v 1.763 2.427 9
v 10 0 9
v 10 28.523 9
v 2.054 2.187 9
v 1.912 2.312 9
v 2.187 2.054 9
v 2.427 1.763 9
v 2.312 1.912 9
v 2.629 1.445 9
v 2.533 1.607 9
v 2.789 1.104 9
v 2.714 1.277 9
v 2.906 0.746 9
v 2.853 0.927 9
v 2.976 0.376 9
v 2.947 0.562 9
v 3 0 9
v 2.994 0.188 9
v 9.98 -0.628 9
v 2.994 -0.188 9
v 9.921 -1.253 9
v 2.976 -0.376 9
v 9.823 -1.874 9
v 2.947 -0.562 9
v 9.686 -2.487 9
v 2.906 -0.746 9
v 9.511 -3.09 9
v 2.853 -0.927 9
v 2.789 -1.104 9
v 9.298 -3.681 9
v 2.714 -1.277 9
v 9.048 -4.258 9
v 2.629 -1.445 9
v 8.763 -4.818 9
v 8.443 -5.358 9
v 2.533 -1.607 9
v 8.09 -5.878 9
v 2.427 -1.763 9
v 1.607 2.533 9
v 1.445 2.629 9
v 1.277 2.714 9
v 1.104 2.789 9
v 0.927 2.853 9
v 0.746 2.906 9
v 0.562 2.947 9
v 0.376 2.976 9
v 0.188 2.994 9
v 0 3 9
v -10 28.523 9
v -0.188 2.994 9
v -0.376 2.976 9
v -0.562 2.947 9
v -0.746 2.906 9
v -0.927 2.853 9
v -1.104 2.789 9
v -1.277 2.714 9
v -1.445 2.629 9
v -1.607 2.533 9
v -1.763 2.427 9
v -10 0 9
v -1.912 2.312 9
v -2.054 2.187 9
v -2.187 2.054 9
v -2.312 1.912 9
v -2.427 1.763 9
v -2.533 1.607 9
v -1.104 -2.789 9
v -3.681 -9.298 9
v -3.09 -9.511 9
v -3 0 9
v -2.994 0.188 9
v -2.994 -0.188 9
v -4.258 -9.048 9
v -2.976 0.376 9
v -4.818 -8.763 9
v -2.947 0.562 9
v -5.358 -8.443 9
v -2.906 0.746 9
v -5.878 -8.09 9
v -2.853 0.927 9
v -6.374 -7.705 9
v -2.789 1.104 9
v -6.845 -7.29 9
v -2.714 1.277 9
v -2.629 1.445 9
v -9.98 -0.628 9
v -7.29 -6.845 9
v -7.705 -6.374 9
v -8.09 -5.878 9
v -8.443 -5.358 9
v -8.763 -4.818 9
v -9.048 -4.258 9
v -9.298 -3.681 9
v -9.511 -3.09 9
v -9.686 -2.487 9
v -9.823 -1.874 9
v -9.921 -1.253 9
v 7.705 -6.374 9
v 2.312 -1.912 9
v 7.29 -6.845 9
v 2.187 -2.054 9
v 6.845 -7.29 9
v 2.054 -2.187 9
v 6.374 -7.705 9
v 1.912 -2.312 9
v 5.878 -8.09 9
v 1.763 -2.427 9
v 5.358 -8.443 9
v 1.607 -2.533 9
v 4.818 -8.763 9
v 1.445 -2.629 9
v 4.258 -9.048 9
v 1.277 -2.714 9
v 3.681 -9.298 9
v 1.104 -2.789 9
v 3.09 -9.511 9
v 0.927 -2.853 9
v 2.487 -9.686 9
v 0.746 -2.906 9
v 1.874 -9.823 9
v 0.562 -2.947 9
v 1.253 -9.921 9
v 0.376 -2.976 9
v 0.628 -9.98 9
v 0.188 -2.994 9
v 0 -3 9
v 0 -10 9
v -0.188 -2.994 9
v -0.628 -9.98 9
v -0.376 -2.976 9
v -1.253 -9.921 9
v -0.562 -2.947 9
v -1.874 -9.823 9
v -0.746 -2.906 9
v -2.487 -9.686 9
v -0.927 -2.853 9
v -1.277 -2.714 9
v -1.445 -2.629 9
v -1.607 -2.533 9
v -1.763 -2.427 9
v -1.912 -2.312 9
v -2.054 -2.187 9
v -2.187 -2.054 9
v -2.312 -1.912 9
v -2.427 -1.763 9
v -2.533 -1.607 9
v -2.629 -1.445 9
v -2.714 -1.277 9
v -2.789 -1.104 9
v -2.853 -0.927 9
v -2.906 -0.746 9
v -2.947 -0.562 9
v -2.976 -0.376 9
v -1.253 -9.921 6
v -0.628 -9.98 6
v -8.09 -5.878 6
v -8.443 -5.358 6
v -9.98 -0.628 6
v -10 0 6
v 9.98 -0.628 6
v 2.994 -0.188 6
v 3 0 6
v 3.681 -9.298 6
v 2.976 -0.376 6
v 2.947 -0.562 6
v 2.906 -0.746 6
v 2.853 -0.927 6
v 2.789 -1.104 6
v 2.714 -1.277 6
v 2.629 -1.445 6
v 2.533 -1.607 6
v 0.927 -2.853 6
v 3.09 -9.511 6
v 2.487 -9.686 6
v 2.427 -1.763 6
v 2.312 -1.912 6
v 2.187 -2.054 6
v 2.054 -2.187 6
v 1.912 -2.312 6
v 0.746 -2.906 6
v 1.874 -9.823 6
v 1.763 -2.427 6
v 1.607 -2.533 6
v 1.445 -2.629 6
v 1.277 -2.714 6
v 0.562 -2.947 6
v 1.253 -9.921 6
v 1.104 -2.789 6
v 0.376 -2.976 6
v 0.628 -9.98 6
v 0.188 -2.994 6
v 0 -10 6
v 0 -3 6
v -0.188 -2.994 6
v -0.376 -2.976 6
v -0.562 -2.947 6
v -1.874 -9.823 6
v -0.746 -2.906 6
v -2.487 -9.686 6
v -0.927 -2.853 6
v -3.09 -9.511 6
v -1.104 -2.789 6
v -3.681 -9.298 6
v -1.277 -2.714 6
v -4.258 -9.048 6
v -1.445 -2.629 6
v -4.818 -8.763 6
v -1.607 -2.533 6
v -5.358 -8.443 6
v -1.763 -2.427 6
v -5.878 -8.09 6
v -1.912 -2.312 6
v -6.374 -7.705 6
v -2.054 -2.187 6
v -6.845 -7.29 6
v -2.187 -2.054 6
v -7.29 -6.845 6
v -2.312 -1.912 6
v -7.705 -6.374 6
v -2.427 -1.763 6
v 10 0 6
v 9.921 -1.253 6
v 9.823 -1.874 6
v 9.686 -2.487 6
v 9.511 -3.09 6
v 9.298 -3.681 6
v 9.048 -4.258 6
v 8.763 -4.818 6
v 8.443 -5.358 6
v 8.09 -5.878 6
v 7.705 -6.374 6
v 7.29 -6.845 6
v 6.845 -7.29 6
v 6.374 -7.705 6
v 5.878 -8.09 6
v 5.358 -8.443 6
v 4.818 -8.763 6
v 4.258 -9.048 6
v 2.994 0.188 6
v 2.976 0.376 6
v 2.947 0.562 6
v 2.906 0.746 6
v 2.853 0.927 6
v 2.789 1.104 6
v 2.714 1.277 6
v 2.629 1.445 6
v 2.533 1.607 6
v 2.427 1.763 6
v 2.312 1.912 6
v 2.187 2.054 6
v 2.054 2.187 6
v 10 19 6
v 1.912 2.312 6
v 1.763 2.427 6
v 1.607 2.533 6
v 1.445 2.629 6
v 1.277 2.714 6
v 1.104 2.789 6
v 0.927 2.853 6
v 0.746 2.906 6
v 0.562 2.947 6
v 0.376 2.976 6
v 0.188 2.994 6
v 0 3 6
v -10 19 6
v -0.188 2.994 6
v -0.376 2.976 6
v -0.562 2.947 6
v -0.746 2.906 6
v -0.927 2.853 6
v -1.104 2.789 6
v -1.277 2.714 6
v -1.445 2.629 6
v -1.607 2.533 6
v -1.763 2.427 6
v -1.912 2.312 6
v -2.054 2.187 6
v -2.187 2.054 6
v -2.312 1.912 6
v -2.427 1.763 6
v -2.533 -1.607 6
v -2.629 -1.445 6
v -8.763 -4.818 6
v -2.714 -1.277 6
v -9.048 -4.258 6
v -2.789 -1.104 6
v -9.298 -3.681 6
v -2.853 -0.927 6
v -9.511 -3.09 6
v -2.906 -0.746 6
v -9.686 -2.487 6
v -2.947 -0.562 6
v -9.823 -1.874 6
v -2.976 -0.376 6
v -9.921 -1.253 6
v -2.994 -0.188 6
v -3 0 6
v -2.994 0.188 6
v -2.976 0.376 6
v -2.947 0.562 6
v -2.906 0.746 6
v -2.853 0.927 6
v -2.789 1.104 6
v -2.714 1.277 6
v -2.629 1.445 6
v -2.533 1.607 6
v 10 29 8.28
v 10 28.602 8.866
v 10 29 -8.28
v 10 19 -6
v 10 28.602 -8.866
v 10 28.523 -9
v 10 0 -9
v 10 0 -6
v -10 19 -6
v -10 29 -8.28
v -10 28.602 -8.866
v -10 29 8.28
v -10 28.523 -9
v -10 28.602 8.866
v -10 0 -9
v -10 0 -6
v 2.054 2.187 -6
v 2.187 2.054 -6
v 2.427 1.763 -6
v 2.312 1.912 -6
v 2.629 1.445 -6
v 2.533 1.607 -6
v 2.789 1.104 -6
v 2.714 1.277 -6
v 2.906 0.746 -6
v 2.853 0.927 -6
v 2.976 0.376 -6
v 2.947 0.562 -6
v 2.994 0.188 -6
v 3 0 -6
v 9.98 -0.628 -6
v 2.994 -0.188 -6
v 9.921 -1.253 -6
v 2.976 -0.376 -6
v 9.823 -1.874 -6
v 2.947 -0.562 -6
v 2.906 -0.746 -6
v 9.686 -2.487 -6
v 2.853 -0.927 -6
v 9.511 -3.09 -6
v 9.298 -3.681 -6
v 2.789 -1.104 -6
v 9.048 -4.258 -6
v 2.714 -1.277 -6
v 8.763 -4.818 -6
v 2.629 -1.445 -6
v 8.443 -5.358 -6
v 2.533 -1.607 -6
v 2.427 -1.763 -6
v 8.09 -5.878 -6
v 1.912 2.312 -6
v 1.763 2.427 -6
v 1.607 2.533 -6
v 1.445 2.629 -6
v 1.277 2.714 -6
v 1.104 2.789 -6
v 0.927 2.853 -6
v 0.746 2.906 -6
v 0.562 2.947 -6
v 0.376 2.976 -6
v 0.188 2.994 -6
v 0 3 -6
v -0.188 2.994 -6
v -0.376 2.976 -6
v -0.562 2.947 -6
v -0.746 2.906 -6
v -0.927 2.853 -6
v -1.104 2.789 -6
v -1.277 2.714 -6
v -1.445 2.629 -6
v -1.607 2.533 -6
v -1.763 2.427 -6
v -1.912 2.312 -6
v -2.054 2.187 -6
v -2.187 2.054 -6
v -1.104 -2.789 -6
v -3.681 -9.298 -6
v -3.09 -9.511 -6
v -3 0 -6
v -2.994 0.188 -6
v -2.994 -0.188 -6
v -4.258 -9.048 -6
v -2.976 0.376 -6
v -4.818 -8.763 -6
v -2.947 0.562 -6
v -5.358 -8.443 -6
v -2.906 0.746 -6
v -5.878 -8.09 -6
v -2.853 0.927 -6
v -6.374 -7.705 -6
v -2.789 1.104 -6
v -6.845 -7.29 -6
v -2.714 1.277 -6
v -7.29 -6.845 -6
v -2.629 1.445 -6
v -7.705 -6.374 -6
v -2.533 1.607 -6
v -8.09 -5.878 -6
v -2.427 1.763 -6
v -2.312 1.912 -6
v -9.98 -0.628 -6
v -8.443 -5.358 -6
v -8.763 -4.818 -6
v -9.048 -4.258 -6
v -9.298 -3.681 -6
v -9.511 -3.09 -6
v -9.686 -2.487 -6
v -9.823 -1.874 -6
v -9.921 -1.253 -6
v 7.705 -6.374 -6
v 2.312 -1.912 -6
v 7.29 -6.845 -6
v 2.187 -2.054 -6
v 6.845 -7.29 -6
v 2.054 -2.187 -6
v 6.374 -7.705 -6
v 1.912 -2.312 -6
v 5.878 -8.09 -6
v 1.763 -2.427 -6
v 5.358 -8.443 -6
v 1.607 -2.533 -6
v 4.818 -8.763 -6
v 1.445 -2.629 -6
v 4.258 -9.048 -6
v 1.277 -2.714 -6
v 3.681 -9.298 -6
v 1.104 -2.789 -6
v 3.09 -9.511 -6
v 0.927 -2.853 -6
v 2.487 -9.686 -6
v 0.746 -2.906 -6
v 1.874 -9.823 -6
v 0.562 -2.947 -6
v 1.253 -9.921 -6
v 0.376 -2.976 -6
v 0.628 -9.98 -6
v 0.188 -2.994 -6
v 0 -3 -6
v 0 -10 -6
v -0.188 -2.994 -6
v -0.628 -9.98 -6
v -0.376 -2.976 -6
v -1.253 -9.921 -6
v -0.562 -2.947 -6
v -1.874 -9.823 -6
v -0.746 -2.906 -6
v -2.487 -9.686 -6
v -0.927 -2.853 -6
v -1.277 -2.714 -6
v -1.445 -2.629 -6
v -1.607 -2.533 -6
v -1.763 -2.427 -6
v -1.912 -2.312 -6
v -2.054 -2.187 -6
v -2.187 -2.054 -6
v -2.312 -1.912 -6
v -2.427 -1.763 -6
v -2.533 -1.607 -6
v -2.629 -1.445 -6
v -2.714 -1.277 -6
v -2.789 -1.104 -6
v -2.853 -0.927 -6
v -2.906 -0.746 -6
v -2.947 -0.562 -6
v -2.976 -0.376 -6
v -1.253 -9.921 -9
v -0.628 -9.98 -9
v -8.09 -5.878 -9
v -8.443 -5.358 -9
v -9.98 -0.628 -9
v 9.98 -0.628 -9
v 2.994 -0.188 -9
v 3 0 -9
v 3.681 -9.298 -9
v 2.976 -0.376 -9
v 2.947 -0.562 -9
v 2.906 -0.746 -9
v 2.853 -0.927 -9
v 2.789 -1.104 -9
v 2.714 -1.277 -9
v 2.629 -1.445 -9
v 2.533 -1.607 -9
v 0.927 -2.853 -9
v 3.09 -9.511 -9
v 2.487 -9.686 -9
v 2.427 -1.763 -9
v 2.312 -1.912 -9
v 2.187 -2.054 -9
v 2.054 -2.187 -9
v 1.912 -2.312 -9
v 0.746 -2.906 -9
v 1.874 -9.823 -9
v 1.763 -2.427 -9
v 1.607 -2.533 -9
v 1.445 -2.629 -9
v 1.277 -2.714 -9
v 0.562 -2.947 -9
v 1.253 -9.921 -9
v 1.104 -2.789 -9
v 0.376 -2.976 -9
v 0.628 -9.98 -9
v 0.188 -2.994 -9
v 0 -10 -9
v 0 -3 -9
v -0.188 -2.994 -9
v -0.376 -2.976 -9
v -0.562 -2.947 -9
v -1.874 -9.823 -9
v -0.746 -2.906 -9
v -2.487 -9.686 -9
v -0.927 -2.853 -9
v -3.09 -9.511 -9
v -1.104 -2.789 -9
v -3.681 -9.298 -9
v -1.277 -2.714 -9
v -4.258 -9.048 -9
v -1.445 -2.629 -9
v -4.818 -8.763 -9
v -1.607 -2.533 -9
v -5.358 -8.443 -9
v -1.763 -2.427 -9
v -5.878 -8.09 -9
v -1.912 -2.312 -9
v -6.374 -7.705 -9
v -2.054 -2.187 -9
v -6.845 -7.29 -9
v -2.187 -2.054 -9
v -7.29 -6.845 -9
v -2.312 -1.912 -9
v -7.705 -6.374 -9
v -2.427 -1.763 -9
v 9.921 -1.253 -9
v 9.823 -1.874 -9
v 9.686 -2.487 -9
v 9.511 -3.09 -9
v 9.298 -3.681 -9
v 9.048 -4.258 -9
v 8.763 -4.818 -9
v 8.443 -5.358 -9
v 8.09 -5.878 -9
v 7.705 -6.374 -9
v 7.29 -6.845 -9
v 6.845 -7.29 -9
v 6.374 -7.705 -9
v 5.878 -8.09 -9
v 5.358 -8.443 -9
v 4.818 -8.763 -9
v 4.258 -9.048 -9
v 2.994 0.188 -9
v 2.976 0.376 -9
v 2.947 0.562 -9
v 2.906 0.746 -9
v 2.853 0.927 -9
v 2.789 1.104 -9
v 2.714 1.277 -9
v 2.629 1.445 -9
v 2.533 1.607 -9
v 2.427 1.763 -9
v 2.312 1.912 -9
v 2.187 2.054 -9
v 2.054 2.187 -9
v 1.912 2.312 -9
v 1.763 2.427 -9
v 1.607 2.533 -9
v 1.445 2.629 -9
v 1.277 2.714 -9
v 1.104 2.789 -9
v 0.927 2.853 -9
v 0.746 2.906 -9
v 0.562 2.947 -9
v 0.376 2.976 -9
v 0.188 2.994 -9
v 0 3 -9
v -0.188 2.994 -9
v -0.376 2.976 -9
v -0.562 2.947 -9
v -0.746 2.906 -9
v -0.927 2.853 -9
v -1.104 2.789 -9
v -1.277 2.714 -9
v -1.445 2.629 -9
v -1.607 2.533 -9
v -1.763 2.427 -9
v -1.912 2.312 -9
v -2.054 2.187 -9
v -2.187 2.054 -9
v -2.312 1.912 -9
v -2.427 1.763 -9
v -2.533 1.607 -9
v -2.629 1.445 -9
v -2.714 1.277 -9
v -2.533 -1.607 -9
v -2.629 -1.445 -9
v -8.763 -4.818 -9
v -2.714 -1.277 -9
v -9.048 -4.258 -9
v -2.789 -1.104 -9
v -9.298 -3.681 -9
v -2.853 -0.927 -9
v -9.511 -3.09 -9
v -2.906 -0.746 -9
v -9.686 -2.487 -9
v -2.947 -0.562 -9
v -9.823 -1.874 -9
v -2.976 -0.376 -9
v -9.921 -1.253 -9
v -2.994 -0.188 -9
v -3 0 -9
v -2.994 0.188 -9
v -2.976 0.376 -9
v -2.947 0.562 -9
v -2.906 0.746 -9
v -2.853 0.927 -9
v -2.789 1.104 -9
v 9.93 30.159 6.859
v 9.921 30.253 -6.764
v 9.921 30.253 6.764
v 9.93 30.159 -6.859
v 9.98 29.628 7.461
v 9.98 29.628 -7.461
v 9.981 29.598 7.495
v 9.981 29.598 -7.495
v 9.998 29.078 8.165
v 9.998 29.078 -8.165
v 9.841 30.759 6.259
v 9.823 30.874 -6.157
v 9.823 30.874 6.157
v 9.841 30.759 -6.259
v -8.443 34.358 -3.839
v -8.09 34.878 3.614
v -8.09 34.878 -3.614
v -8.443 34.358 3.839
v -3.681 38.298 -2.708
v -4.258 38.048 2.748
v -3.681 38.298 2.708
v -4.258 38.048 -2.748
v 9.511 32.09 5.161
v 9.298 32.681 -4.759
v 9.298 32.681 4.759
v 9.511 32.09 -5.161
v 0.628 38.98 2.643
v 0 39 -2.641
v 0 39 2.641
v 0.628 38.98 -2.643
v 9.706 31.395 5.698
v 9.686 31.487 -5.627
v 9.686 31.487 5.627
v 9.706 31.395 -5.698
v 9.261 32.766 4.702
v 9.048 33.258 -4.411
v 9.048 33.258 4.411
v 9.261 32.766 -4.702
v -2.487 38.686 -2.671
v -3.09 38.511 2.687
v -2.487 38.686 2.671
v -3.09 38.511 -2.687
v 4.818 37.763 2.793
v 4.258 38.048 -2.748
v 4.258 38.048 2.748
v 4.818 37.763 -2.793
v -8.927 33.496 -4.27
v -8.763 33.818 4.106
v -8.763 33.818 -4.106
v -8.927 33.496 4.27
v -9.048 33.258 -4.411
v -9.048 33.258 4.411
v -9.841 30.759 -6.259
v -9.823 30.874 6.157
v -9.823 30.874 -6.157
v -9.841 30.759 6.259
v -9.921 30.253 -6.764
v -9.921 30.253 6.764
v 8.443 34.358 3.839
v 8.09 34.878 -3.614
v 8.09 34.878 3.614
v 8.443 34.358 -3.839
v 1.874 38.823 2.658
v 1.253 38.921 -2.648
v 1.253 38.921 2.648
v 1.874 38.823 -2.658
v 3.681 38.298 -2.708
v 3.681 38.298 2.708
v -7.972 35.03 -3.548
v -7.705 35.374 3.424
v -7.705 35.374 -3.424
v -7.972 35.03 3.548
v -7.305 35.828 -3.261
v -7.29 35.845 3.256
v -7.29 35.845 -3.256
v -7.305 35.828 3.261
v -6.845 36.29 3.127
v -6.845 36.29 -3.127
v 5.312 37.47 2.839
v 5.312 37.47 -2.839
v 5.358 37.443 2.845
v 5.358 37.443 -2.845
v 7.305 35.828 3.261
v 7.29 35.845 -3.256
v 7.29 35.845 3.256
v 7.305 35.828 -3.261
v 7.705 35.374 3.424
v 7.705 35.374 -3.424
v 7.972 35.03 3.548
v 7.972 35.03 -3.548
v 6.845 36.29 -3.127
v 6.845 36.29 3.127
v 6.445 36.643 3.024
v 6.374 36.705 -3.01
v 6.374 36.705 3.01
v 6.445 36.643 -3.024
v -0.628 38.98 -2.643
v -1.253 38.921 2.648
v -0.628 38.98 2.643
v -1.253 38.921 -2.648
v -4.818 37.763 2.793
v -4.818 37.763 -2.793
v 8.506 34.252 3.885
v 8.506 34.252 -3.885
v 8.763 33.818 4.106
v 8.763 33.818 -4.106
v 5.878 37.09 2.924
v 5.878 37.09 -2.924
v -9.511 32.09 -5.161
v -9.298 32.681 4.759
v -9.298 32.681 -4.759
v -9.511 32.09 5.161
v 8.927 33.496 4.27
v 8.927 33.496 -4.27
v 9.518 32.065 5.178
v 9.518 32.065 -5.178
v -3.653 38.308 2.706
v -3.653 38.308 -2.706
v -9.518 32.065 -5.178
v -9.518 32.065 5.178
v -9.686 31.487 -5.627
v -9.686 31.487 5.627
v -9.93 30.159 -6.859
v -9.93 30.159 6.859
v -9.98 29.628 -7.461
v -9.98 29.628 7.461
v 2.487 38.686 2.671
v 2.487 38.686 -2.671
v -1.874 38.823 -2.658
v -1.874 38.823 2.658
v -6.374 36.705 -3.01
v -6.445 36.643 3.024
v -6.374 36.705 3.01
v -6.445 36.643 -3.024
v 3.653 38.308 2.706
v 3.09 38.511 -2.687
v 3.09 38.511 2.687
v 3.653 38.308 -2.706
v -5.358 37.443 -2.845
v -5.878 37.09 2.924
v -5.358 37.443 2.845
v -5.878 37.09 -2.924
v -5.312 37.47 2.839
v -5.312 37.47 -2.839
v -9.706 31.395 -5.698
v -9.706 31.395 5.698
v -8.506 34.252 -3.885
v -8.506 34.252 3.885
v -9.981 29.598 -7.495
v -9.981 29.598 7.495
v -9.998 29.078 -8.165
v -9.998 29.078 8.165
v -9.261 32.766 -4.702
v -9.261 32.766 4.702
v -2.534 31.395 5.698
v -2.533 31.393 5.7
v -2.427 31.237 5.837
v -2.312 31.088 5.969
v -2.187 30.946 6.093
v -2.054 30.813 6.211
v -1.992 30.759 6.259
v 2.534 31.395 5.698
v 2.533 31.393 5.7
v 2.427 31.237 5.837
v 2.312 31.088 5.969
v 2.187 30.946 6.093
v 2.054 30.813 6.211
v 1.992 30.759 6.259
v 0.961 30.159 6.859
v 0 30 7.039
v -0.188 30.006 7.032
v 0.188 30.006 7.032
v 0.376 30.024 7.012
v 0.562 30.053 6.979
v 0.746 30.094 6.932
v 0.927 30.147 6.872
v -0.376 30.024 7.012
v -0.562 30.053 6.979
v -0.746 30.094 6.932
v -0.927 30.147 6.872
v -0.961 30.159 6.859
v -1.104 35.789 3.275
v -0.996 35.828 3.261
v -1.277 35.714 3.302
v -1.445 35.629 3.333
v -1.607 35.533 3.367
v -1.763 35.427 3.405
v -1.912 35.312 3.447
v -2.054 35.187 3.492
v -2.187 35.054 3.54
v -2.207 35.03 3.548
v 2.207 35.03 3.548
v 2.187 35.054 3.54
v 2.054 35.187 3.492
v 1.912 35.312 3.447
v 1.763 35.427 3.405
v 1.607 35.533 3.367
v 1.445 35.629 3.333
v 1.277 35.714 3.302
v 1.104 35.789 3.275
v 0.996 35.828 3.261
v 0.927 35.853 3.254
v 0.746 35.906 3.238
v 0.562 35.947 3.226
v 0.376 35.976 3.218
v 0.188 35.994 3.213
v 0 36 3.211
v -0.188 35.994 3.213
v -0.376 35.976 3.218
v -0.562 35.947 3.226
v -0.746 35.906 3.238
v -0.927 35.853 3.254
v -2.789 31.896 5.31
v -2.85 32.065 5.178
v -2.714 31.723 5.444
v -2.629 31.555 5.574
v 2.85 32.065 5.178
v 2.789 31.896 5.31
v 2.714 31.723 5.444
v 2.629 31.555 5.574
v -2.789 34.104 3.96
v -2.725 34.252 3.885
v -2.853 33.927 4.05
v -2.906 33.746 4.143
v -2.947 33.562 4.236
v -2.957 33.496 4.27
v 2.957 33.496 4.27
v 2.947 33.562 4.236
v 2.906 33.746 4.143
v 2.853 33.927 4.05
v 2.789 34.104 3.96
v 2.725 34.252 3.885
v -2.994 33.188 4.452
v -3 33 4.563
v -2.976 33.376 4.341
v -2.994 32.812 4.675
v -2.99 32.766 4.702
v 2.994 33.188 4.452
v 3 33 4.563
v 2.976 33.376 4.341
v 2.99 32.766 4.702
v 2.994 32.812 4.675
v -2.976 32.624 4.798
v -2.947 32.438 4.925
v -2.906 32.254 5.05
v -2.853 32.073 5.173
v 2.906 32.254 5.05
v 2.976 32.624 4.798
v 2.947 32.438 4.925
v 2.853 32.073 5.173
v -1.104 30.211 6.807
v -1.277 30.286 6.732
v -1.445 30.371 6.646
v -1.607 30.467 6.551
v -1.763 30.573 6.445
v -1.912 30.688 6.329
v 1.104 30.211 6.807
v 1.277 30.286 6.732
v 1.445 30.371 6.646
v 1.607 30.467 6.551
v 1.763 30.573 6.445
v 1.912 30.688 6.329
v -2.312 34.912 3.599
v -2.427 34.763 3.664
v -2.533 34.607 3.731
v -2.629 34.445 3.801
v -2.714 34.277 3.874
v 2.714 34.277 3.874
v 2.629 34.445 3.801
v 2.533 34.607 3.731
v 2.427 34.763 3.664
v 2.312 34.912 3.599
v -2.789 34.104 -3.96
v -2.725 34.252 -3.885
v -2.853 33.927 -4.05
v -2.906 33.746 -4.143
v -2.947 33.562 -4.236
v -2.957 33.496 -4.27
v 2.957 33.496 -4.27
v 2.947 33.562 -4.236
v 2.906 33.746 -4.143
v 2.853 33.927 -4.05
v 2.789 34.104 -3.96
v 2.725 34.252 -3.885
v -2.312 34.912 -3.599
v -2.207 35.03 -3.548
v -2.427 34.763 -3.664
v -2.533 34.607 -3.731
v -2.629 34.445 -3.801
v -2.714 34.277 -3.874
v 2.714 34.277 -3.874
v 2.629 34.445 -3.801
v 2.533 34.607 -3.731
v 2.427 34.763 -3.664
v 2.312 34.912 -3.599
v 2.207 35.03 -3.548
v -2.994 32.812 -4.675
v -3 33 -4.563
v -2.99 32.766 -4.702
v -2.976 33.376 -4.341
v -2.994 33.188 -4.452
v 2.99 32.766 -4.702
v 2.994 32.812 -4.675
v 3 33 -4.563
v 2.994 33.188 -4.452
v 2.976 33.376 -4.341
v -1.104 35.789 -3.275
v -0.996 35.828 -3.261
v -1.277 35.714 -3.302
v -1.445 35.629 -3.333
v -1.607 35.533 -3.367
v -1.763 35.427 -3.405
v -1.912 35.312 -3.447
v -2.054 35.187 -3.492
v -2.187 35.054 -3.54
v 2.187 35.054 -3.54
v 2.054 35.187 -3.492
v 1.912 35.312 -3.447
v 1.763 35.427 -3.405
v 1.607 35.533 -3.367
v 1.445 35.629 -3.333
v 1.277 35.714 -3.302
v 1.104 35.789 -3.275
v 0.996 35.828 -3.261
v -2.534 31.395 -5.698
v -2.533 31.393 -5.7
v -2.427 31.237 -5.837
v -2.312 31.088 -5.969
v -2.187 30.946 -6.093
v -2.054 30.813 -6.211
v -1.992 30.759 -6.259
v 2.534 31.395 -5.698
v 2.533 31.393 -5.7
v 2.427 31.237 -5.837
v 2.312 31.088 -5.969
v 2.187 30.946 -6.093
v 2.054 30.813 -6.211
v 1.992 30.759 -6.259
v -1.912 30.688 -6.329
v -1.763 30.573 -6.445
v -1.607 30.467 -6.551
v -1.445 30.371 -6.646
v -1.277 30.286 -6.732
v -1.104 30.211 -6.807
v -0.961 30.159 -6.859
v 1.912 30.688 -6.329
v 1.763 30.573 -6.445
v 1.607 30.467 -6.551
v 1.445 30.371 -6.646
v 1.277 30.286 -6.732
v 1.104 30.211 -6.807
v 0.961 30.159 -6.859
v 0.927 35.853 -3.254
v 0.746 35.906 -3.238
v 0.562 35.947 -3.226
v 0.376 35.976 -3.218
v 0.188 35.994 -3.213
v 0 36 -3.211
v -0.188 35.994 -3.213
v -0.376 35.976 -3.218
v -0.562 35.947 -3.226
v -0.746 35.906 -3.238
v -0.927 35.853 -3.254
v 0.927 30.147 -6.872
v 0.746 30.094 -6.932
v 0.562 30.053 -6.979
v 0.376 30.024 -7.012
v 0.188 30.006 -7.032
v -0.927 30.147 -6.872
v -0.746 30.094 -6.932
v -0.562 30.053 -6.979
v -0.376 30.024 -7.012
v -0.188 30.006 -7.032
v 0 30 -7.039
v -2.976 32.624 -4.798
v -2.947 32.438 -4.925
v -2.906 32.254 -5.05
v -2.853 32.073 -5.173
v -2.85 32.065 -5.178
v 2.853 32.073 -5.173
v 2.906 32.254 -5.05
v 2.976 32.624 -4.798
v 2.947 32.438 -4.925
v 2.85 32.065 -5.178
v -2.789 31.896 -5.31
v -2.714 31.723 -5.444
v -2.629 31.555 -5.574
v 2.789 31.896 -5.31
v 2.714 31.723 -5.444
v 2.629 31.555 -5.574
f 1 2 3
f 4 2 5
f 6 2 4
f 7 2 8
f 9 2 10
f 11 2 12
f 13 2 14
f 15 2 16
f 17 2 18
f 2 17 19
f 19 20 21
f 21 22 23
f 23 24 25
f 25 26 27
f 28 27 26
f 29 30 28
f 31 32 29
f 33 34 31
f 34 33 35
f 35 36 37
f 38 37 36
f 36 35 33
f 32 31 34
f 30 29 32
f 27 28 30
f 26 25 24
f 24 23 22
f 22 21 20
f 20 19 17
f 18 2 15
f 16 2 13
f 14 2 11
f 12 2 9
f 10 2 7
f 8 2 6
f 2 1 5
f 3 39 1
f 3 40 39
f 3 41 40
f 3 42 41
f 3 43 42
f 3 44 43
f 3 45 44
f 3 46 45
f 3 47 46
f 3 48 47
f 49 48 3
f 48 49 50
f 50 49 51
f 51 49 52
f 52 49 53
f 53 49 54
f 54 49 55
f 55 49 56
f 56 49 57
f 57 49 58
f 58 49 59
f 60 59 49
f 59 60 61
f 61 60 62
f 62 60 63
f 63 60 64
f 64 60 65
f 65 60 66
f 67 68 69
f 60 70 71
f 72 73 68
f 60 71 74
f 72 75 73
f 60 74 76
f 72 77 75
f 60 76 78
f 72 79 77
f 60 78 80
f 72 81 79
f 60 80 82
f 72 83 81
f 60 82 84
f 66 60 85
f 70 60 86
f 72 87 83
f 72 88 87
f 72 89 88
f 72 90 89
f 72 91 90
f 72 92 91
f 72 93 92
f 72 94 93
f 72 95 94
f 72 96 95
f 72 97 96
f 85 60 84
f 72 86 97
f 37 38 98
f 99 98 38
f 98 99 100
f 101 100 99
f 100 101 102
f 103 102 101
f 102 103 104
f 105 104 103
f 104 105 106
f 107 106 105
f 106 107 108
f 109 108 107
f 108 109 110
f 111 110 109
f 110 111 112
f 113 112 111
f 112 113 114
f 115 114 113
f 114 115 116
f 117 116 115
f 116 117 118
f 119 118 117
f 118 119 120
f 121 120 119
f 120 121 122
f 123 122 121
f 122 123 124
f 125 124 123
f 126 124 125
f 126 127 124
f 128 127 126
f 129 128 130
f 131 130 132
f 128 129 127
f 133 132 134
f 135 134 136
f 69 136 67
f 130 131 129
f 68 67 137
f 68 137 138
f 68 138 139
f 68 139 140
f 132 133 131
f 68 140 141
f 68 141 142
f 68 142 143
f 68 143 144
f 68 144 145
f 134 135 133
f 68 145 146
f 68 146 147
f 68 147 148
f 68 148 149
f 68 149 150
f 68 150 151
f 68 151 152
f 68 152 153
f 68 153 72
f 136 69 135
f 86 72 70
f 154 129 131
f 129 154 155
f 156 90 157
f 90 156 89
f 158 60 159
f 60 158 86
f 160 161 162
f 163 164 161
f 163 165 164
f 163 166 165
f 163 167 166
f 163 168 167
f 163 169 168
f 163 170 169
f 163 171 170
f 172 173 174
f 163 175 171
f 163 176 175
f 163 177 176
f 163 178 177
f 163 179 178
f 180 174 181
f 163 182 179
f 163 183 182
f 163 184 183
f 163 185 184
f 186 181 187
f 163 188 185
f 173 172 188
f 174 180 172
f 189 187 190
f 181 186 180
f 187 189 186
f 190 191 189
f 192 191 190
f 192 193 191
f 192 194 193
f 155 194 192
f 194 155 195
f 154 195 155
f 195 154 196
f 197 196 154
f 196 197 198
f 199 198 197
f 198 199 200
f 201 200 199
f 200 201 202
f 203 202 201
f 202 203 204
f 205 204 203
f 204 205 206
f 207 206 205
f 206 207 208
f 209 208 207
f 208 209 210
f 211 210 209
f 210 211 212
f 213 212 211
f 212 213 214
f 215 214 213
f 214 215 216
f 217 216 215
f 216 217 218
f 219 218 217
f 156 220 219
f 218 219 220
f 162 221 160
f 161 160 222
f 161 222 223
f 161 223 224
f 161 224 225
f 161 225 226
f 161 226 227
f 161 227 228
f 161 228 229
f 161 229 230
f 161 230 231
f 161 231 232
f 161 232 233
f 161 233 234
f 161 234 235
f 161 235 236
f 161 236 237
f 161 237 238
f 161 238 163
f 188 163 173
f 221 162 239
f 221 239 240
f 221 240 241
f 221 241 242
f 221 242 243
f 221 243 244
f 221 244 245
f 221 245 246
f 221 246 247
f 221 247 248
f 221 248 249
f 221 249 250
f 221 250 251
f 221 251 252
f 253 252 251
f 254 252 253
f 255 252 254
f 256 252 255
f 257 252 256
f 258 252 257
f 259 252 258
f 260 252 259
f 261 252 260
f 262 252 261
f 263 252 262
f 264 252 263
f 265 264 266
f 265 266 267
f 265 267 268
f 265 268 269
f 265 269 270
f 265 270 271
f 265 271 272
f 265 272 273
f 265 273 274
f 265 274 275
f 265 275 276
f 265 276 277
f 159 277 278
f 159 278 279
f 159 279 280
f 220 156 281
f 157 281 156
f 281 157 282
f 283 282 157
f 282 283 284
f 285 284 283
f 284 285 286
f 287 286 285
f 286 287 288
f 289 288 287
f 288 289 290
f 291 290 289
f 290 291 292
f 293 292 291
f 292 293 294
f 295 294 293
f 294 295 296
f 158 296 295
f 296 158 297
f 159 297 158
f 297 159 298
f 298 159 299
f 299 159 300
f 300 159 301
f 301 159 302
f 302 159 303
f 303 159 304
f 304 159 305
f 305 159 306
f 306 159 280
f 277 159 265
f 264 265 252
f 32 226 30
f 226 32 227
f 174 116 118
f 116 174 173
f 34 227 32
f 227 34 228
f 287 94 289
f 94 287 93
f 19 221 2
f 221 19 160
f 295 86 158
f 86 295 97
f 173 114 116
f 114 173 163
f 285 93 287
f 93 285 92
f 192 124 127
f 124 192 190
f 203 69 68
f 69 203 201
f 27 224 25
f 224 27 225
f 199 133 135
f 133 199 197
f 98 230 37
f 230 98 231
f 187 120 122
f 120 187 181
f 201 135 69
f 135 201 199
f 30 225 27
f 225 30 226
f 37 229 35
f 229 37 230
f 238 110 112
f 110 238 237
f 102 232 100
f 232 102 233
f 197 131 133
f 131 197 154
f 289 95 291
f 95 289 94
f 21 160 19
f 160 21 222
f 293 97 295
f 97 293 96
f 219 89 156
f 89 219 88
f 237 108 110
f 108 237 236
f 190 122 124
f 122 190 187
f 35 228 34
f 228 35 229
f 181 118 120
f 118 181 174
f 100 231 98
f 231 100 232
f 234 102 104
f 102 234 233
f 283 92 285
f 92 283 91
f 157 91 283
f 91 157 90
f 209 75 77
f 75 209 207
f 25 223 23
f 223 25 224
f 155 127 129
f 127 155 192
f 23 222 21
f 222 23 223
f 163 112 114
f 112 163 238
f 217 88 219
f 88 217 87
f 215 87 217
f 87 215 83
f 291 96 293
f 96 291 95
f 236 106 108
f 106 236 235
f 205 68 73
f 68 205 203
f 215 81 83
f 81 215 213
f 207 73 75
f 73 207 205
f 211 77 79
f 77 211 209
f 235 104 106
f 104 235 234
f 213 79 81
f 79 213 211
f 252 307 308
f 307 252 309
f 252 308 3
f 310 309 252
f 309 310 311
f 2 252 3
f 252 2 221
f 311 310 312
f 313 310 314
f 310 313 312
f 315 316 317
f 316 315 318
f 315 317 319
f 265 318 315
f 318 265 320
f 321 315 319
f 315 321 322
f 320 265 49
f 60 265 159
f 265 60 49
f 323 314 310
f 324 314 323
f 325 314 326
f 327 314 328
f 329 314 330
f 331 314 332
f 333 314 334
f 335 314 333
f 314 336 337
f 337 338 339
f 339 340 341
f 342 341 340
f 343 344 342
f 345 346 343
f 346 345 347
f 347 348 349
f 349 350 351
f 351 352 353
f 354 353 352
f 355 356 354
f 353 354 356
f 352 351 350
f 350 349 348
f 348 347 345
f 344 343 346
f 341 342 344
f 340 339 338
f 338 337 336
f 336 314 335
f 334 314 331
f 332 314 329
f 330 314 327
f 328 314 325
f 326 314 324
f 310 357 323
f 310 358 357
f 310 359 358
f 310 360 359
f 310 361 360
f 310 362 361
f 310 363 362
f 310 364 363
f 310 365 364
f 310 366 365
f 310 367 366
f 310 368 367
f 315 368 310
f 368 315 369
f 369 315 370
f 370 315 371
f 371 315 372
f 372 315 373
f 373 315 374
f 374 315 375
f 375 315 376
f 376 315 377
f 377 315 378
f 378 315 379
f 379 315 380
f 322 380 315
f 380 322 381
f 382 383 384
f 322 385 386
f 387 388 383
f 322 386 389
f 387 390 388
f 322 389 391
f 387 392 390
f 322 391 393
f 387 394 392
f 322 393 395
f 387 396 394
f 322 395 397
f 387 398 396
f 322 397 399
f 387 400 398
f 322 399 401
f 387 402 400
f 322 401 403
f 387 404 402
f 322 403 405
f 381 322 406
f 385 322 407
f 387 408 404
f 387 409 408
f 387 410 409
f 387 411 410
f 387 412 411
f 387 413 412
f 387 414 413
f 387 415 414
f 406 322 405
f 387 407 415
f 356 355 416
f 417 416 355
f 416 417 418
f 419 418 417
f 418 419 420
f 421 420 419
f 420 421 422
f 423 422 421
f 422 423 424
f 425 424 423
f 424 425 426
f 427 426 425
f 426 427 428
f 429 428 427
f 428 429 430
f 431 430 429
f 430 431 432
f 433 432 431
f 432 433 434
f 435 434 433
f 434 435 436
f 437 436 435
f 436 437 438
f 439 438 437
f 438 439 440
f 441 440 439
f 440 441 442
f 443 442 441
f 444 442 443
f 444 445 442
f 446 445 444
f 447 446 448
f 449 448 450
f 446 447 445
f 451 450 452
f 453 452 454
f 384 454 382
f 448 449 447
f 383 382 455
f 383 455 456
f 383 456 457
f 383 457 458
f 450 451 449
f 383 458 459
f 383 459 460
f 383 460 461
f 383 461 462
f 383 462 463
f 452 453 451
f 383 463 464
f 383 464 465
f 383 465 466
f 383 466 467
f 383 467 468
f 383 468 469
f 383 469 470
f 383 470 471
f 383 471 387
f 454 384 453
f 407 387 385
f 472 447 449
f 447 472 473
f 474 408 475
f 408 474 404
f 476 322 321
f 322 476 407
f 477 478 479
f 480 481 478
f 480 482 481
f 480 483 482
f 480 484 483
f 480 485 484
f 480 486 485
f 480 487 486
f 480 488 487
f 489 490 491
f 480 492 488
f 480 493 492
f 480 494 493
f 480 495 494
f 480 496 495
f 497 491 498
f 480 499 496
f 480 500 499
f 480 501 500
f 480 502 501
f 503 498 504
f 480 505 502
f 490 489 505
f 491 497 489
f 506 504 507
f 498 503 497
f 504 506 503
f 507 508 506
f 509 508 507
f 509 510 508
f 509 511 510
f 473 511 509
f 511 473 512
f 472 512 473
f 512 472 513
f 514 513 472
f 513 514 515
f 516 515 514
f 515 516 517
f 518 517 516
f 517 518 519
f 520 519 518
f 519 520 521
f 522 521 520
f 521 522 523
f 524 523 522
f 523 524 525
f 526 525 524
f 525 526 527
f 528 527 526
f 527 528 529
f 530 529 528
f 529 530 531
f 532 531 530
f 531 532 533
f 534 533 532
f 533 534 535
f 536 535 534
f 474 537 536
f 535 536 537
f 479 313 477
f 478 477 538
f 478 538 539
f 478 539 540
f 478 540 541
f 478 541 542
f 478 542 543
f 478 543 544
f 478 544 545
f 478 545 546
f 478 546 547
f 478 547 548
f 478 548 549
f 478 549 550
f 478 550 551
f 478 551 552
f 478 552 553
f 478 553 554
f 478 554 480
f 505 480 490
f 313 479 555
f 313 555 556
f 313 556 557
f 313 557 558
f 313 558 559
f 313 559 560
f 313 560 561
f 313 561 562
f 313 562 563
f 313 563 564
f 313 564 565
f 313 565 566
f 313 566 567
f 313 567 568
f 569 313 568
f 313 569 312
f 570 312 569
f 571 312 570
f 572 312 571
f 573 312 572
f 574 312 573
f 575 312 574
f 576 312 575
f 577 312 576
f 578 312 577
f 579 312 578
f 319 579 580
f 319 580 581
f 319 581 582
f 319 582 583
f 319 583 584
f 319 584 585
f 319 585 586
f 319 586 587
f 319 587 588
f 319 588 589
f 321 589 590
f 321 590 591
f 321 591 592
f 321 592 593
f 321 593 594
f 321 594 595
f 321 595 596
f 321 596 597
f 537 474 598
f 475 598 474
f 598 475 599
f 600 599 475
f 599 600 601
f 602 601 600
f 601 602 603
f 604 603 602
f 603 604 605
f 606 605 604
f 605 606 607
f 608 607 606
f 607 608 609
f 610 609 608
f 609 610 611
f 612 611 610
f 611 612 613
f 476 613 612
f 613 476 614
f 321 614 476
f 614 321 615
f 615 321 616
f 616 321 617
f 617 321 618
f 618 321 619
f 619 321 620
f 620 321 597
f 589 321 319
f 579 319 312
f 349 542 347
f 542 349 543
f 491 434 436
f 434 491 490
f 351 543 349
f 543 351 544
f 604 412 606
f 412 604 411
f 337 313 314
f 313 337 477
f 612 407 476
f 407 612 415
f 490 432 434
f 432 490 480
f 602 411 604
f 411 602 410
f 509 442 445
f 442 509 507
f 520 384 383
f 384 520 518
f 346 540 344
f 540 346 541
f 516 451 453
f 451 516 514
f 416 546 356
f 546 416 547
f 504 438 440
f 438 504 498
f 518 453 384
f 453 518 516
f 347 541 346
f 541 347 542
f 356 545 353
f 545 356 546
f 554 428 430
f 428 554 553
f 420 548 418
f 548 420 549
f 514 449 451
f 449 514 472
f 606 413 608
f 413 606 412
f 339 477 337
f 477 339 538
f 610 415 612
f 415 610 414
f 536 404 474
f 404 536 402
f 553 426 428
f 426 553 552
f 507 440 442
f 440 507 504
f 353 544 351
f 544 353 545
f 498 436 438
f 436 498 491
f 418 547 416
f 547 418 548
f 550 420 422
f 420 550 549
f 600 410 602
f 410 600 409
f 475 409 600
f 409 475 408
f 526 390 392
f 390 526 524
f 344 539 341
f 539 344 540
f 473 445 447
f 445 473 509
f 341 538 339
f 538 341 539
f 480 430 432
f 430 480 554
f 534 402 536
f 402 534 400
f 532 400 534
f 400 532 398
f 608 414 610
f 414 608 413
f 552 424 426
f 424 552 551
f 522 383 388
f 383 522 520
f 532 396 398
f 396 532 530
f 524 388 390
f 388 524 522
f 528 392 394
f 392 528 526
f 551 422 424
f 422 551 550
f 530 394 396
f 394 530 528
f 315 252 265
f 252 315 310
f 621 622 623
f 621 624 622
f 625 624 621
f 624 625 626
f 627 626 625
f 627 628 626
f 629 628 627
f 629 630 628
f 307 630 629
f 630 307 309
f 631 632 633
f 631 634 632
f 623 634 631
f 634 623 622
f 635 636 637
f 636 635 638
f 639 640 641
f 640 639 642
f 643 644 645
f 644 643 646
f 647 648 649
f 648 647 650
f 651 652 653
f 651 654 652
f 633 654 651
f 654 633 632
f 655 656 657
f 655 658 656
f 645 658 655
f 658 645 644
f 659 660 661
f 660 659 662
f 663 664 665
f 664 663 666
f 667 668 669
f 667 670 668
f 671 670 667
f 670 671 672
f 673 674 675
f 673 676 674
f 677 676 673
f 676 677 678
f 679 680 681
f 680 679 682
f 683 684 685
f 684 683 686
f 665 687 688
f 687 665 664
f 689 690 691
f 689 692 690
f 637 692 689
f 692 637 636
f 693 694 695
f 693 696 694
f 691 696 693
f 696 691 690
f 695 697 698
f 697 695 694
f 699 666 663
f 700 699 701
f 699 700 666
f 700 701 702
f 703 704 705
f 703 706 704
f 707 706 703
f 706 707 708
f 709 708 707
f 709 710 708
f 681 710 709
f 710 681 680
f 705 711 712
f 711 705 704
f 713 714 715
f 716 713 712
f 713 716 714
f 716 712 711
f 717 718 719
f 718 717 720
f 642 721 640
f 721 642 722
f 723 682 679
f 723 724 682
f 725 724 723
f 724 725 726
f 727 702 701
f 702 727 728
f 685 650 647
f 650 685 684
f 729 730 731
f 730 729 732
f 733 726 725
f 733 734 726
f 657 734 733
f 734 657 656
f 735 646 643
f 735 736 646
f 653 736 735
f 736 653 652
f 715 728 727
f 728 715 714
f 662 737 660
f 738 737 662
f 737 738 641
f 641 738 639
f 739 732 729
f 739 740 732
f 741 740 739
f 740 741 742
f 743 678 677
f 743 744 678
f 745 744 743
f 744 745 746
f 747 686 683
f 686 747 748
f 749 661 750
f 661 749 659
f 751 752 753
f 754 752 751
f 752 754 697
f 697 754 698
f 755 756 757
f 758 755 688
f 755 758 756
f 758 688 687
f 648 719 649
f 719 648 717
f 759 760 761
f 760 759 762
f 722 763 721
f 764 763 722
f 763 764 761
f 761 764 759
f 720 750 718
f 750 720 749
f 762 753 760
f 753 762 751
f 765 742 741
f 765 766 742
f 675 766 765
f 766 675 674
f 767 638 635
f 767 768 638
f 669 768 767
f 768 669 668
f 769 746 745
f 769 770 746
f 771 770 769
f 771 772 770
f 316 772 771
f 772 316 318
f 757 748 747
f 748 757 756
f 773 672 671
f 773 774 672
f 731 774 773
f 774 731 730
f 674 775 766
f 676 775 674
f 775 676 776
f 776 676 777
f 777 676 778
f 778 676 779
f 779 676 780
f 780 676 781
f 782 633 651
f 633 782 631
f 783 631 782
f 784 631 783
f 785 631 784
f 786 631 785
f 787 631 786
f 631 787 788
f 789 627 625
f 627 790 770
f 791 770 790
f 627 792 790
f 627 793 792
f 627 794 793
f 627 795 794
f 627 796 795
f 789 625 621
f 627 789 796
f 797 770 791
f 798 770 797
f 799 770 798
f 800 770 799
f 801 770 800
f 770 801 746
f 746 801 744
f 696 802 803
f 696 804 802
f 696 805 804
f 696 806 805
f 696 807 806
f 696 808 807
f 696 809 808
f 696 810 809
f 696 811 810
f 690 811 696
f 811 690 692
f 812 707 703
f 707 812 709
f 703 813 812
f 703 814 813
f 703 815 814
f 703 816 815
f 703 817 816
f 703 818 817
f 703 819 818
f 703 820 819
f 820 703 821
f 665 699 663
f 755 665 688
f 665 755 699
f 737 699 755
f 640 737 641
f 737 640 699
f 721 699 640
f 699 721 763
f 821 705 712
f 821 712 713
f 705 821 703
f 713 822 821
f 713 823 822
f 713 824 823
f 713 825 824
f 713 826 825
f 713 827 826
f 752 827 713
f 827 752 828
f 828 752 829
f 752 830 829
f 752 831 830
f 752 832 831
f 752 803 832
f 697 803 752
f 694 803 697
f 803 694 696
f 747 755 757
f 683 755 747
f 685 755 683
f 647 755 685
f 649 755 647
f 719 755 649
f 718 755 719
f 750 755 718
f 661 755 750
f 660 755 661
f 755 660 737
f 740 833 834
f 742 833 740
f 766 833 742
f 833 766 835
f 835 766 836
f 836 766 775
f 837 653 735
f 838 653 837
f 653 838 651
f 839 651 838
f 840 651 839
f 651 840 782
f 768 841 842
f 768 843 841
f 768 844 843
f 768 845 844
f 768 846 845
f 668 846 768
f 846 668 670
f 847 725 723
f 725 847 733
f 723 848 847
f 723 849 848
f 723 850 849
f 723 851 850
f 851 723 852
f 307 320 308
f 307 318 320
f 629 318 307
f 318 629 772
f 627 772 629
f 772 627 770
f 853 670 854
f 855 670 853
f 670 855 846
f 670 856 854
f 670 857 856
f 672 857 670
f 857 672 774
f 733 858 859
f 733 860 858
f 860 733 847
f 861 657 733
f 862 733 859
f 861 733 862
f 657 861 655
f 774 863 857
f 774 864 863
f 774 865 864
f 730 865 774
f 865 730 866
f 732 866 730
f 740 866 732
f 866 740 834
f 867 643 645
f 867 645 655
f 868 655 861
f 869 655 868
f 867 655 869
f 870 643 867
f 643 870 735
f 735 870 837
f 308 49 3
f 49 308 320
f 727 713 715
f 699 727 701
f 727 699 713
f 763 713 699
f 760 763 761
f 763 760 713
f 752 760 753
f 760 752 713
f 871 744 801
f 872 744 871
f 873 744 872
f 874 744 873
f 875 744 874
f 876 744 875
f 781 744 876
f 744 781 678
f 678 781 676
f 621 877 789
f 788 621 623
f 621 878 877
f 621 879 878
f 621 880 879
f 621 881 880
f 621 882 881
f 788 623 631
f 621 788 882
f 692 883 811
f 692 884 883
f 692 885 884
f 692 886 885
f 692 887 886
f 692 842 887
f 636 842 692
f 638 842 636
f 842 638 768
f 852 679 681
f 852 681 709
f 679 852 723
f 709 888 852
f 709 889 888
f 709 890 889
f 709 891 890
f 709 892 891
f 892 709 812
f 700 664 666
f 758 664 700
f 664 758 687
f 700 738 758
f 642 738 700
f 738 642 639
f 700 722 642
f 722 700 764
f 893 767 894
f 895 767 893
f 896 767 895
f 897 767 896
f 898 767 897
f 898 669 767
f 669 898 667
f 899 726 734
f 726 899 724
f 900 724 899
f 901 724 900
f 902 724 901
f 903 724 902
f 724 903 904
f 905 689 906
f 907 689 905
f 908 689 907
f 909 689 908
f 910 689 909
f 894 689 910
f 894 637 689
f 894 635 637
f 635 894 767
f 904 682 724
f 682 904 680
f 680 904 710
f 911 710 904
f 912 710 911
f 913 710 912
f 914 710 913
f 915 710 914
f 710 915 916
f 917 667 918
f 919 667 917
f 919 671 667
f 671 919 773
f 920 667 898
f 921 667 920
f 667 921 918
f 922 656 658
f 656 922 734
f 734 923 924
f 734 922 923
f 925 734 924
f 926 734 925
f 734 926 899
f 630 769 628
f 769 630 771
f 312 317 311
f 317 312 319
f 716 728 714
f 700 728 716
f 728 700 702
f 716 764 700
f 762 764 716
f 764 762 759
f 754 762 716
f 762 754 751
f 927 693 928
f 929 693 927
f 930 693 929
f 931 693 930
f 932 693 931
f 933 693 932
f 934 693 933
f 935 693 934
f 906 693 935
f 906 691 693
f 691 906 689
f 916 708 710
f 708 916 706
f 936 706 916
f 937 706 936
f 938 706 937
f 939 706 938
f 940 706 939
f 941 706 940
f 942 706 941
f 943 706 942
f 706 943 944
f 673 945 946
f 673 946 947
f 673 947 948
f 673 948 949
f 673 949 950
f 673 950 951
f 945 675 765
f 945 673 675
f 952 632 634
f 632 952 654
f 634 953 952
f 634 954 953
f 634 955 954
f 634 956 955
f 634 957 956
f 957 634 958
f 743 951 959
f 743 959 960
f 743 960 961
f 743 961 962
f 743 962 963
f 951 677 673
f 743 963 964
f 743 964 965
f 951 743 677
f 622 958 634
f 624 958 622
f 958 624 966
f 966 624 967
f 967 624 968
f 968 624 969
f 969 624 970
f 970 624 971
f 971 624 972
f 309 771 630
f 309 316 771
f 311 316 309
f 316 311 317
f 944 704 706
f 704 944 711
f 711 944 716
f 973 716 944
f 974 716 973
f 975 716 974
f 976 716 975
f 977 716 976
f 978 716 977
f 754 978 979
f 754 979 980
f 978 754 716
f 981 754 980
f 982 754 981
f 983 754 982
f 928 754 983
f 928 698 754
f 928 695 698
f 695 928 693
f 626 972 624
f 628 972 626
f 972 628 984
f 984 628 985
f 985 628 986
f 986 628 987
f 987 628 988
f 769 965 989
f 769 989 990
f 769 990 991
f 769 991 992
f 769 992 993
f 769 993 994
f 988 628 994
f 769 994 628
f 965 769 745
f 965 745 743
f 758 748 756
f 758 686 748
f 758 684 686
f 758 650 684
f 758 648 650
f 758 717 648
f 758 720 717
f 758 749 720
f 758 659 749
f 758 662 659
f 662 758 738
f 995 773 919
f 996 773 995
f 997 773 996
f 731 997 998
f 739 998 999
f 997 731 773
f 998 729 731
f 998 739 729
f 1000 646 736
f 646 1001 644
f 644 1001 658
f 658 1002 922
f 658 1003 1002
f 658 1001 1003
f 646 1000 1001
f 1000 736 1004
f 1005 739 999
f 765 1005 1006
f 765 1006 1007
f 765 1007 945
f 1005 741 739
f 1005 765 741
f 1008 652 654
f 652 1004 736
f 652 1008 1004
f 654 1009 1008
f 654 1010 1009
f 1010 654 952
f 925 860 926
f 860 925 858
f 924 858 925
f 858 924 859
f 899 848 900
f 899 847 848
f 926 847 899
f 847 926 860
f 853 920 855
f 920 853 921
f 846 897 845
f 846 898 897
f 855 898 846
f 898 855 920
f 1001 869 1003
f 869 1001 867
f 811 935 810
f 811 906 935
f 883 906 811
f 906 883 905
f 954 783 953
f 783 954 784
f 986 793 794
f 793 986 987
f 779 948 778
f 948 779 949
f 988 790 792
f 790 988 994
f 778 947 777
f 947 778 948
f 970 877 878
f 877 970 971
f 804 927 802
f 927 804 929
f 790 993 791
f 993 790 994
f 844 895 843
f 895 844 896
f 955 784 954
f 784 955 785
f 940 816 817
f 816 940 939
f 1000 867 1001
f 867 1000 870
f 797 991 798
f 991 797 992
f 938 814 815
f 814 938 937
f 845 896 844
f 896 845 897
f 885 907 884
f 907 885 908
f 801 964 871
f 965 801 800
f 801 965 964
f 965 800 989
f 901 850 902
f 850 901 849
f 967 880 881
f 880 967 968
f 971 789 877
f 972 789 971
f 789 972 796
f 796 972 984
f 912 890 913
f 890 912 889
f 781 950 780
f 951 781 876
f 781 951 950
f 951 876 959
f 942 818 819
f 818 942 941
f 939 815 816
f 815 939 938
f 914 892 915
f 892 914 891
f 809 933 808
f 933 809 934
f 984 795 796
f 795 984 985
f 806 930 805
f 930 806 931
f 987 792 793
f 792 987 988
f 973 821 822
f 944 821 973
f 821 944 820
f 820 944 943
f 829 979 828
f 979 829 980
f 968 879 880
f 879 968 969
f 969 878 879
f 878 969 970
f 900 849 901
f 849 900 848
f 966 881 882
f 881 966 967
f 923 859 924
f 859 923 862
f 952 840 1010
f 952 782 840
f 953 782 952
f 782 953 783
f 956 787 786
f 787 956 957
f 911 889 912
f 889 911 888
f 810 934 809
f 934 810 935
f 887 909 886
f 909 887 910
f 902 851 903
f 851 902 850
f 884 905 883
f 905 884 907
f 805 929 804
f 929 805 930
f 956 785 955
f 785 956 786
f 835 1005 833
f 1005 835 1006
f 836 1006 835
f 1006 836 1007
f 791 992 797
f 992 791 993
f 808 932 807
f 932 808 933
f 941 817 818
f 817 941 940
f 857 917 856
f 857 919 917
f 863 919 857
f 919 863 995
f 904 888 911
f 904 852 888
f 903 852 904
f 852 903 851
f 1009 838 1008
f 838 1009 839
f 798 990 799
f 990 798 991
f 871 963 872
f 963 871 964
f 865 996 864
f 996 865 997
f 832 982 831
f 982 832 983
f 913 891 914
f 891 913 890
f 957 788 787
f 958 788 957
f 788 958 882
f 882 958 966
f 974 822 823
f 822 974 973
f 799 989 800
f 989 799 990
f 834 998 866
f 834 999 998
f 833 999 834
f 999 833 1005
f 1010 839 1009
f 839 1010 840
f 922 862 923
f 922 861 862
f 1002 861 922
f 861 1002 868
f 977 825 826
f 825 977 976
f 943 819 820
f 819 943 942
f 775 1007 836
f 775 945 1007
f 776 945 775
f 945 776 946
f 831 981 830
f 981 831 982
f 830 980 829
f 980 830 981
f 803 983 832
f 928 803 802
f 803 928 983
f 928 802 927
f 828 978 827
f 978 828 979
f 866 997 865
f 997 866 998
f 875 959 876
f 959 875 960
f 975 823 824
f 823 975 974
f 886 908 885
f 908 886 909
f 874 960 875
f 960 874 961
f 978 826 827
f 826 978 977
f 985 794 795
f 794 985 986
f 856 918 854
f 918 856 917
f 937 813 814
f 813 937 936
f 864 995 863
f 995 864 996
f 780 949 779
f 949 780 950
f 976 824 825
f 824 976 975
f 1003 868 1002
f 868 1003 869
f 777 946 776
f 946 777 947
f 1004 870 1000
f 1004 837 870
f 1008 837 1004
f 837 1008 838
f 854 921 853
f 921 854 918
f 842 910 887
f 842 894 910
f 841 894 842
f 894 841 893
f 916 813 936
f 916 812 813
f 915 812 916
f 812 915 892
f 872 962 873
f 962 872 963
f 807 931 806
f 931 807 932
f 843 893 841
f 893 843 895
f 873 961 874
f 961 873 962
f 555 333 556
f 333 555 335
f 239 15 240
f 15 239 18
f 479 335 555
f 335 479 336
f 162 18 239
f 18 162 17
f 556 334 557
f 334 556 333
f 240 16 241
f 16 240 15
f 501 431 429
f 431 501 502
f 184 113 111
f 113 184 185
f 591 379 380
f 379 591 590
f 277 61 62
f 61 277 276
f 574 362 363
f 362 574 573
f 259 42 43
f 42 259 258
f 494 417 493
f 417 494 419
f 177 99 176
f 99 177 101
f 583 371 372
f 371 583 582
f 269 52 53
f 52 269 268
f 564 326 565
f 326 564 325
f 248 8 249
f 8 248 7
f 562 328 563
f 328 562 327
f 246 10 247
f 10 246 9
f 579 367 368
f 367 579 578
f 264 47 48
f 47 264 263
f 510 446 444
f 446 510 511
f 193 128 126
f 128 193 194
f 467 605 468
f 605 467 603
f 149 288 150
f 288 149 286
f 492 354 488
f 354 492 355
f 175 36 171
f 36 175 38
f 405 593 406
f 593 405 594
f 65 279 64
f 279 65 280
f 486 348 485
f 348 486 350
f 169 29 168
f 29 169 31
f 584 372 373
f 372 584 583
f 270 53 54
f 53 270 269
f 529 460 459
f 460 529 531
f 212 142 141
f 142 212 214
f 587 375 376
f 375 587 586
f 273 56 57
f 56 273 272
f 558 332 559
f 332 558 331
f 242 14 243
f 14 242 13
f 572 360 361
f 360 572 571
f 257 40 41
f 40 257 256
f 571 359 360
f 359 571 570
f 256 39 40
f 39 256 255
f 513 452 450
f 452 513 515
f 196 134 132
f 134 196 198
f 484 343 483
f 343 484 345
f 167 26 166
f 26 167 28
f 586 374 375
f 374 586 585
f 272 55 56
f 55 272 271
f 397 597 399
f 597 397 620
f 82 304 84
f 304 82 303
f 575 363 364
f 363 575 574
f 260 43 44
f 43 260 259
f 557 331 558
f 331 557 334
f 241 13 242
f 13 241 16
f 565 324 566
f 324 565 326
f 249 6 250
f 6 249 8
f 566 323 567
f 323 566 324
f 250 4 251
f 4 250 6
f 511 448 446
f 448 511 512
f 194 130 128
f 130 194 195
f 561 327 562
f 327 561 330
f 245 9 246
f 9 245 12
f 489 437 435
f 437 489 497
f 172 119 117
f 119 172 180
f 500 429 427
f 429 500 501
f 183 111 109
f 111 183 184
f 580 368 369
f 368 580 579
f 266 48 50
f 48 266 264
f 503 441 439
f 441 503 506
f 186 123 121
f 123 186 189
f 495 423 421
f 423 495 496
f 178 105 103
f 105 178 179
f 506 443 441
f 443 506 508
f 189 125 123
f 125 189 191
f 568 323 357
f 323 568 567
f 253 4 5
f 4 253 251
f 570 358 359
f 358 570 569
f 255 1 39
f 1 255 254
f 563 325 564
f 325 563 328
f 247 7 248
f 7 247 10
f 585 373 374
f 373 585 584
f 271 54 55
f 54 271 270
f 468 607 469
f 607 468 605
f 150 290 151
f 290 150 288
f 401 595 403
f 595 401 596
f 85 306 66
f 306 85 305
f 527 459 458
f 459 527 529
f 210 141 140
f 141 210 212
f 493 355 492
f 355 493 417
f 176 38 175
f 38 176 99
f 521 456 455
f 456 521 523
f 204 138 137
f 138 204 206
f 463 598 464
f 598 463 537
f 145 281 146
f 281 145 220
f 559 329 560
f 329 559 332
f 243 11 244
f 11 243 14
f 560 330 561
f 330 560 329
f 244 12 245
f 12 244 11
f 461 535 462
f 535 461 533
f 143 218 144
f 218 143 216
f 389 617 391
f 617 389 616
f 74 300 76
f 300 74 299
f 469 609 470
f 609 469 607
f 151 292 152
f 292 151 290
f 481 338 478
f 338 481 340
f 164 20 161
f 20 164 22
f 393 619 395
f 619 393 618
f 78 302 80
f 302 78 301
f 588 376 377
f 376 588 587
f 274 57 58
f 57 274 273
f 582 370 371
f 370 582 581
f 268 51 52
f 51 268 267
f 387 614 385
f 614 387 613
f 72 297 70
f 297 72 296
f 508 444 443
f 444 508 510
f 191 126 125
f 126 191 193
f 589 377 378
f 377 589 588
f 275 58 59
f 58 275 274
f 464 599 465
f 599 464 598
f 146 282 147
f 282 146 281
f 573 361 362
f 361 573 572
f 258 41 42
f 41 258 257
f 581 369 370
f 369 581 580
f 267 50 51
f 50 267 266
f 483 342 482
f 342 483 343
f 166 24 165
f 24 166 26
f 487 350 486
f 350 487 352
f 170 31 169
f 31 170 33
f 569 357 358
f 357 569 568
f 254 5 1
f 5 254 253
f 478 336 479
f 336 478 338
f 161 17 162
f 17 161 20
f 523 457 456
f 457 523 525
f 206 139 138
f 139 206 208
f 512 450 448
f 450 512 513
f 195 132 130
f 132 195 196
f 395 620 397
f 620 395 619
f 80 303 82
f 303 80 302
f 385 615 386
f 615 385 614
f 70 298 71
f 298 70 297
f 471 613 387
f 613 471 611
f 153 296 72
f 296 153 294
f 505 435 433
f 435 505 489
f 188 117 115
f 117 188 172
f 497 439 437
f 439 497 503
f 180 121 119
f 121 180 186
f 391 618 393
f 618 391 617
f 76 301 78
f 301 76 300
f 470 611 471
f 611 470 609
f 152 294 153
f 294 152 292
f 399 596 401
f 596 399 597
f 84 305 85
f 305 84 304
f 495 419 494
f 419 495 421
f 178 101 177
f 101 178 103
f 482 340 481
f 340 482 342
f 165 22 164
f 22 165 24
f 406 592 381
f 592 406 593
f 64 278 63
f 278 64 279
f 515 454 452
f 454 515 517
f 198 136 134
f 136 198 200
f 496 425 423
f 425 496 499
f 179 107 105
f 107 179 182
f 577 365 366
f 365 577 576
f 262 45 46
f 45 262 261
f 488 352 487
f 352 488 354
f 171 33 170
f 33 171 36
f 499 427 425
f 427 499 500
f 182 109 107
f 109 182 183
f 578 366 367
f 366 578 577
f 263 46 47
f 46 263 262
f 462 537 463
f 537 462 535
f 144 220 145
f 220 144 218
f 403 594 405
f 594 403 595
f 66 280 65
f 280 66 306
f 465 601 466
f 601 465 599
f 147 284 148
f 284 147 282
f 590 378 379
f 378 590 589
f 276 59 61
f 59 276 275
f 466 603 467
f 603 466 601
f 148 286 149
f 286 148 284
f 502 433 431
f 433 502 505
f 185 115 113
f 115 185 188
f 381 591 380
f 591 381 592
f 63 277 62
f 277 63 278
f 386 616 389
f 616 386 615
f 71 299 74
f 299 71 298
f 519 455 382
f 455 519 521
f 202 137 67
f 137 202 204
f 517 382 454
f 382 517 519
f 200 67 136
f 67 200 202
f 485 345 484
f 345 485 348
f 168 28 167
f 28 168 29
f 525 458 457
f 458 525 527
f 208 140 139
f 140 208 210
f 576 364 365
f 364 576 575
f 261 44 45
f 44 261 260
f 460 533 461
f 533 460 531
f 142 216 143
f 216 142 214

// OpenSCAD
//
// A test
// A Block with its wheel
//
// See drawing options at the bottom of the code.
//


module torus(ringDiam, torusDiam) { 
	rotate_extrude(convexity = ringDiam, $fn = 100) {
		translate([ringDiam / 2, 0, 0]) {
			circle(r = torusDiam / 2, $fn = 100);
		}
	}
} 

module wheel(ringDiam, torusDiam, axisDiam) {  
  difference() {
    cylinder(h=1.1 * torusDiam, r=(ringDiam / 2), center=true, $fn=100); // Thw wheel of the Pulley
    cylinder(h=12, r=(axisDiam / 2), center=true, $fn=100);  // Axis
    torus(ringDiam, torusDiam);                 // The groove
  }
}

module oneCheek(thickness, width, axisToBottomLen, axisDiam) {
  union() {
    translate([0, 0, 0]) {
      cylinder(h=thickness, r=(width / 2), center=true, $fn=100);
    }
    translate([0, axisToBottomLen / 2, 0]) {
      cube(size=[width, axisToBottomLen, thickness], center=true);
    }
  }
}

module block(sideThickness,       // Cheek's thickness
             sideWidth,           // Cheek's width
             internalThickness,   // Between the cheeks
             wheelPlusRopeDiam,   // Wheel + rope
             axisDiam) {          // axis diam
  totalThickness = internalThickness + (2 * sideThickness);
  difference() {
    union() {
      translate([0, 0, (cheekThickness / 2) + (internalThickness / 2)]) {
        oneCheek(sideThickness, sideWidth, wheelPlusRopeDiam, axisDiam);
      }
      translate([0, 0, -((cheekThickness / 2) + (internalThickness / 2))]) {
        oneCheek(sideThickness, sideWidth, wheelPlusRopeDiam, axisDiam);
      }
      // The junction between the cheeks
      difference() {
        union() {
          translate([0, 1.2 * wheelPlusRopeDiam, 0]) {
            cube(size=[sideWidth, 0.5 * wheelPlusRopeDiam, internalThickness + (2 * sideThickness)], center=true);
          }
          translate([0, 1.45 * wheelPlusRopeDiam, 0]) {
            cylinder(h=totalThickness, r=(sideWidth / 2), center=true, $fn=100);
          }
        }
        // Trim of each side of the axis
        translate([0, 2 * wheelPlusRopeDiam, 1.4 * ((sideWidth / 2) + (cheekThickness / 2))]) {
          rotate([0, 90, 0]) {
            cylinder(h=sideWidth, r=(1.5 * totalThickness / 2), center=true, $fn=100);
          }
        }
        translate([0, 2 * wheelPlusRopeDiam, - 1.4 * (((sideWidth / 2) + (cheekThickness / 2)))]) {
          rotate([0, 90, 0]) {
            cylinder(h=sideWidth, r=(1.5 * totalThickness / 2), center=true, $fn=100);
          }
        }
        // Block top axis
        translate([0, 1.65 * wheelPlusRopeDiam, 0]) {
          rotate([0, 0, 0]) {
            cylinder(h=totalThickness * 2, r=axisDiam / 2, center=true, $fn=100);
          }
        }
      }
    }
    // The axis
    cylinder(h=(2 * (sideThickness + internalThickness)), r=(axisDiam / 2), center=true, $fn=100);  // Axis
  }
}

// Go !
ringDiam = 30;
torusDiam = 10;  // aka line diam
axisDiam = 6;
cheekThickness = 3;
cheekWidth = 20;

OPTION_FULL = 0;
OPTION_WHEEL_ONLY = 1;
OPTION_BLOCK_ONLY = 2;

option = OPTION_BLOCK_ONLY;

union() {
  if (option != OPTION_BLOCK_ONLY) {
    wheel(ringDiam, torusDiam, axisDiam);
  }
  if (option != OPTION_WHEEL_ONLY) {
    block(cheekThickness, cheekWidth, torusDiam * 1.2, (ringDiam / 2) + (torusDiam / 2), 6);
  }
}
